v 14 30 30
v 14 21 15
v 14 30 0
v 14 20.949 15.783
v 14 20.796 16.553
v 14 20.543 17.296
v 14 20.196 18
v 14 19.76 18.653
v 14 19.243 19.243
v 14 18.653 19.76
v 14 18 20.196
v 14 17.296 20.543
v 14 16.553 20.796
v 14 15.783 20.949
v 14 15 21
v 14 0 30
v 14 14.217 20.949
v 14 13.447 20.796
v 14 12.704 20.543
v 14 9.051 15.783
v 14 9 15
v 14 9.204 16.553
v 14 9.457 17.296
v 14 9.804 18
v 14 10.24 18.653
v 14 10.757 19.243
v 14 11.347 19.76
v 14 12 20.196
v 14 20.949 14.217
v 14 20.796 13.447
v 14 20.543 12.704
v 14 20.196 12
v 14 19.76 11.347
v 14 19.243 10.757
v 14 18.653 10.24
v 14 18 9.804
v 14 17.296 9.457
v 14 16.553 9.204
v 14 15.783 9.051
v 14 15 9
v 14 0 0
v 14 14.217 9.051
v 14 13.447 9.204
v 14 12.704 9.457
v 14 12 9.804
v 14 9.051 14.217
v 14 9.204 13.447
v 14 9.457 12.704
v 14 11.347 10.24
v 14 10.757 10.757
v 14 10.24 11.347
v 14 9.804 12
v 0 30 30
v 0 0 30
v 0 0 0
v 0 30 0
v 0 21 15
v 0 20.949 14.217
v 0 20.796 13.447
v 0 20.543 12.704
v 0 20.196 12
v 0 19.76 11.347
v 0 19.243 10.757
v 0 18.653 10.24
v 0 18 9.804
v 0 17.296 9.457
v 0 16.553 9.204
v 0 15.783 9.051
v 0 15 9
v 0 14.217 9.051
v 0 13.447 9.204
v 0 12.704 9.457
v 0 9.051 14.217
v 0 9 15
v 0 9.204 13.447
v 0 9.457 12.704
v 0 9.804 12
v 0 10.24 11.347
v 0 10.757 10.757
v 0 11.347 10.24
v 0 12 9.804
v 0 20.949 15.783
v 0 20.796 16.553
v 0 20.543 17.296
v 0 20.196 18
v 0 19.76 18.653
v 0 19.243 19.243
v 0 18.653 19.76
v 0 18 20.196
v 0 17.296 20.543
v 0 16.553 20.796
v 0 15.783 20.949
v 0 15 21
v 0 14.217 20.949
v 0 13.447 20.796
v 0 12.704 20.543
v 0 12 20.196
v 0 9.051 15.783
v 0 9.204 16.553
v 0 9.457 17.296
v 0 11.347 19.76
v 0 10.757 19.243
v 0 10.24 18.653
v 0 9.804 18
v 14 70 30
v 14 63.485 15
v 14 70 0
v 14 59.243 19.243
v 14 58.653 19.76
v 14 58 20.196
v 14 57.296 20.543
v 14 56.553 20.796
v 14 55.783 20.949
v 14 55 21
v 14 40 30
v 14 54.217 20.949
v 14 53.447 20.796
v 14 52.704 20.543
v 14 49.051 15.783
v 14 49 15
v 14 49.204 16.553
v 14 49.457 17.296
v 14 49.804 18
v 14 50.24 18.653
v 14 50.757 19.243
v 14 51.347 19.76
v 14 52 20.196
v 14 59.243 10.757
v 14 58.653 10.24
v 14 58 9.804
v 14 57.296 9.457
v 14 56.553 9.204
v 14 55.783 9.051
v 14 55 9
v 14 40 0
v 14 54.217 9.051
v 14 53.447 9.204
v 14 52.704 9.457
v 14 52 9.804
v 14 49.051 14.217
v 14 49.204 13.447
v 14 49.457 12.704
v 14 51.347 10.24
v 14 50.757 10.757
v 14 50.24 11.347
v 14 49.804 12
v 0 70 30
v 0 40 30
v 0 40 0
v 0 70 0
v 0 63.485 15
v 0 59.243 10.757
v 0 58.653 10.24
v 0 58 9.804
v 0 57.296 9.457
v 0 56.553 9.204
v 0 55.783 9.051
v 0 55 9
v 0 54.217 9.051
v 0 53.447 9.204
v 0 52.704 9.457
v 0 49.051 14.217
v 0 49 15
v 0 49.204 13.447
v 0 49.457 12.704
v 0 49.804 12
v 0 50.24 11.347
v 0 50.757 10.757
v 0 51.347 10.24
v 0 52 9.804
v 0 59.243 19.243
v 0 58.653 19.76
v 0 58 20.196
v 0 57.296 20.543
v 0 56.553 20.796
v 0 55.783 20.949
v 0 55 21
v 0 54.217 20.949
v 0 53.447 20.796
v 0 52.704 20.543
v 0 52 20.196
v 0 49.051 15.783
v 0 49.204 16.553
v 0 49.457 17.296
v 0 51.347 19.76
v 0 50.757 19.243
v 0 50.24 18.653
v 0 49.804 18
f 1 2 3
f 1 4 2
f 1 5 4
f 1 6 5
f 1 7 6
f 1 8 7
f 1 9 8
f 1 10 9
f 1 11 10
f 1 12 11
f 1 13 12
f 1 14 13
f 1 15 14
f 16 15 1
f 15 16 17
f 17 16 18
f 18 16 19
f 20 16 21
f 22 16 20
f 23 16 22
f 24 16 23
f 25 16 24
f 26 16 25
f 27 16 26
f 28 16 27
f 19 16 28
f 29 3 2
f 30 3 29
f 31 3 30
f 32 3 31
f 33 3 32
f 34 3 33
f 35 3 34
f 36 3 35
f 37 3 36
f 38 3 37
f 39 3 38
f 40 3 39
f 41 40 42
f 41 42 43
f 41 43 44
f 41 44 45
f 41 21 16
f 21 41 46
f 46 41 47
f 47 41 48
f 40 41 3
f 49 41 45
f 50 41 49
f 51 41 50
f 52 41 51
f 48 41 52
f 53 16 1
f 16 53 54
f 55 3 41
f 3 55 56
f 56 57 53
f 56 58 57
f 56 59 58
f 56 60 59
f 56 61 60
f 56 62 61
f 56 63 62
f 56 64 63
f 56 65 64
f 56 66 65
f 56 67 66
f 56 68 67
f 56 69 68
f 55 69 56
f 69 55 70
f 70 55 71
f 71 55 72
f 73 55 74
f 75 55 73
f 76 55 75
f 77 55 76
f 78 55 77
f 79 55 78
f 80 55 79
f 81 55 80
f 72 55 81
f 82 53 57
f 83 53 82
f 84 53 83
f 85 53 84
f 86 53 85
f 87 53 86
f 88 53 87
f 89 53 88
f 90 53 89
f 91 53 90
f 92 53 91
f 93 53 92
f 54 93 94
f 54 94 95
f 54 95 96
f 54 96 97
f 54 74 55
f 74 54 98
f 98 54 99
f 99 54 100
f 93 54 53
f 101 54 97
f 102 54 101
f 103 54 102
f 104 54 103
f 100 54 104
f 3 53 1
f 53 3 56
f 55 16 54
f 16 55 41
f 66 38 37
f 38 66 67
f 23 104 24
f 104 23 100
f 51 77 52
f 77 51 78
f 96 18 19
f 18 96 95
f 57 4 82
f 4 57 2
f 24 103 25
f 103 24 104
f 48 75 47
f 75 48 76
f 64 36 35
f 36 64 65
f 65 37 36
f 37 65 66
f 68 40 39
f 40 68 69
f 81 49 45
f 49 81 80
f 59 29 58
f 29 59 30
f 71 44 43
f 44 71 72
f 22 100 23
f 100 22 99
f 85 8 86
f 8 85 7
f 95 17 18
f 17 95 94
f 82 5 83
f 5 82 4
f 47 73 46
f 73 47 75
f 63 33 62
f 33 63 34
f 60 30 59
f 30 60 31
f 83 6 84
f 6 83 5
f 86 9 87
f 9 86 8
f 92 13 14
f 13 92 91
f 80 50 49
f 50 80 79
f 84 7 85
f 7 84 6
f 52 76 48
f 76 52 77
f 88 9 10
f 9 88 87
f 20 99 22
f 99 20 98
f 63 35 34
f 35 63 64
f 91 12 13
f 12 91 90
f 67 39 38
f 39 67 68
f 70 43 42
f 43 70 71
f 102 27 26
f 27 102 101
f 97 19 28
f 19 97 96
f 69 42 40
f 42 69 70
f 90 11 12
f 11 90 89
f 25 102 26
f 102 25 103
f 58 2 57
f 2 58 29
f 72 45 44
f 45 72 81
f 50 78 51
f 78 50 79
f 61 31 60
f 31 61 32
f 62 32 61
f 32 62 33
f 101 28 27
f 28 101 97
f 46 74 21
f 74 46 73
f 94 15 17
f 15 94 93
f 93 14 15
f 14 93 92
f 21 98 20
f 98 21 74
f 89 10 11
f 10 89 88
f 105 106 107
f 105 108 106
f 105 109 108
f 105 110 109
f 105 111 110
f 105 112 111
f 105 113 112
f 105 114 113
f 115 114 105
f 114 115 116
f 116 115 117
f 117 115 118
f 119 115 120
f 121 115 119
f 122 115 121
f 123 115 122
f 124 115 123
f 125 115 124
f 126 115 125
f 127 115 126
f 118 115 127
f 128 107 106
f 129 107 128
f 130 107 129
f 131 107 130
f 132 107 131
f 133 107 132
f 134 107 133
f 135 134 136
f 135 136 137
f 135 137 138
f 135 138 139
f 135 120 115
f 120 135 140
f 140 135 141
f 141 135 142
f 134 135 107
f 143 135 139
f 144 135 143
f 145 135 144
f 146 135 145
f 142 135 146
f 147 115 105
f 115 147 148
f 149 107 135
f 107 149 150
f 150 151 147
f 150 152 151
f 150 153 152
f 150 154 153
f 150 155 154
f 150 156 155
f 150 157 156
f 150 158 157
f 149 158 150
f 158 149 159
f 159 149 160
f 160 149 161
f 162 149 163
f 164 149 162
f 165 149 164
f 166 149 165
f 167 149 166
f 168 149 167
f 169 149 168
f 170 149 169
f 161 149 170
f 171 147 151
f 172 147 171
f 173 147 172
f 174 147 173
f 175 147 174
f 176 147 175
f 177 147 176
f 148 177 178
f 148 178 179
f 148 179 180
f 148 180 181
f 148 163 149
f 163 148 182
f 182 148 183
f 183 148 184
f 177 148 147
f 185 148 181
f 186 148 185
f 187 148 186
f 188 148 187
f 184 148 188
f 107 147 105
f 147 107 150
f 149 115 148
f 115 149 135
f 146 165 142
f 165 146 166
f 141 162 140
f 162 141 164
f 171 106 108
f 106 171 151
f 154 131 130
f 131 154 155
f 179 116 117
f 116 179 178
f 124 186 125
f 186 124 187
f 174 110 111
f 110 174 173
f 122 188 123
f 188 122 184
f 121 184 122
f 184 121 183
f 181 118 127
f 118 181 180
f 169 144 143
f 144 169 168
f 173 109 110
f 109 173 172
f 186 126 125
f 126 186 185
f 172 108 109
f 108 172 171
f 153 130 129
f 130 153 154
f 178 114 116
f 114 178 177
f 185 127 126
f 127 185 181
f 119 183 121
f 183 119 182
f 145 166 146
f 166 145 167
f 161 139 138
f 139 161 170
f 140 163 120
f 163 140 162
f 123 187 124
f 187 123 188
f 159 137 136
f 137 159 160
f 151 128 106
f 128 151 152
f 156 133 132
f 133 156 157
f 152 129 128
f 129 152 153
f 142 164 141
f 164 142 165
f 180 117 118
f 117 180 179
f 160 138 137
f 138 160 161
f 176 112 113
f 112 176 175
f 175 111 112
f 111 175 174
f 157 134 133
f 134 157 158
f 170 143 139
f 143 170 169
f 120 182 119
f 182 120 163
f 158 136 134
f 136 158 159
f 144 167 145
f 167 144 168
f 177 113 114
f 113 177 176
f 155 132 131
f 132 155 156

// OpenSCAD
// Teardrop vs round horizontal hole: two blocks, each with a horizontal
// (X-axis) hole through it -- one plain round, one teardrop (round
// bottom, 45deg pointed roof) -- clearly contrasted. The blocks are
// offset along Y (perpendicular to the hole axis, not collinear with it)
// so a camera looking down the shared hole axis (the renderer's "side"
// view, which looks along X) sees both hole end-views side by side
// instead of them overlapping in projection.
$fn = 48;
r = 6; bw = 14; bd = 30; bh = 30; gap = 10;

// round hole block
difference() {
    cube([bw, bd, bh]);
    translate([-1, bd / 2, bh / 2]) rotate([0, 90, 0]) cylinder(h = bw + 2, r = r);
}

// teardrop hole block, offset along Y so it doesn't overlap the round
// block's hole when viewed end-on along the shared X hole axis
translate([0, bd + gap, 0])
difference() {
    cube([bw, bd, bh]);
    translate([-1, bd / 2, bh / 2])
    rotate([0, 90, 0])
    linear_extrude(height = bw + 2)
    union() {
        circle(r = r);
        polygon(points = [
            [r / sqrt(2), r / sqrt(2)],
            [0, r * sqrt(2)],
            [-r / sqrt(2), r / sqrt(2)],
        ]);
    }
}
